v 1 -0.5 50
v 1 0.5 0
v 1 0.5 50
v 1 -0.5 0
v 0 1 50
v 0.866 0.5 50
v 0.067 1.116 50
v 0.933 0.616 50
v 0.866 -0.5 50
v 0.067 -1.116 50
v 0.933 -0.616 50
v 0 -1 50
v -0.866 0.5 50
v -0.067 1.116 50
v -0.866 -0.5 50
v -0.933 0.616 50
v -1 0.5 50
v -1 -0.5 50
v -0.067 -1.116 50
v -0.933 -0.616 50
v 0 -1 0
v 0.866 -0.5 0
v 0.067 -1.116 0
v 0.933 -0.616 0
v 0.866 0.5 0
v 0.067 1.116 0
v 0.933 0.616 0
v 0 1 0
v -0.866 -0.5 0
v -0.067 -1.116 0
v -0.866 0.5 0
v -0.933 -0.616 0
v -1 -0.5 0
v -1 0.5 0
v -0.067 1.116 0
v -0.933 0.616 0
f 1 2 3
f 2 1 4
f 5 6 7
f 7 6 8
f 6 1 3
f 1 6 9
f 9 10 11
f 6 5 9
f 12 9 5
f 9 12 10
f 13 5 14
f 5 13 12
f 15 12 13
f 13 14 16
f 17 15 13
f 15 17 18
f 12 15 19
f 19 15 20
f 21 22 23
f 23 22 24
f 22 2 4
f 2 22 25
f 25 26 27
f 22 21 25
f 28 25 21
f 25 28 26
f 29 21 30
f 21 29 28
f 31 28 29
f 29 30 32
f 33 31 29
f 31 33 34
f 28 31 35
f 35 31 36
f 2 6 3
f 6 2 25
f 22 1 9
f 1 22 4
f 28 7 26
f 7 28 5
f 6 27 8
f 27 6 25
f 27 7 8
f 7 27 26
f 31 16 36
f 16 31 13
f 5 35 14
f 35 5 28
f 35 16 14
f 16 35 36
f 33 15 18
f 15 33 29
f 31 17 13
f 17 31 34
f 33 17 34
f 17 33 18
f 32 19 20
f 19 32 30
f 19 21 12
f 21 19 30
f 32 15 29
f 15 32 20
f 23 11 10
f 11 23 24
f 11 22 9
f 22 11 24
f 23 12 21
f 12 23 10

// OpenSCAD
// Openscad
// Connect library
// Martin Penicka 2015 GPLv3

module spacer_hex(length_mm, screw_type, type){

    // type: MM- male male, FF- female female, MF- male female
    
    module body(){

        for(i = [0,1,2,3,4,5]){
        rotate([0,0,i*60])translate([0,-0.5,0])cube([1,1,length_mm]);
        }
    }

    body();
}

spacer_hex(50, 2, "MM");
